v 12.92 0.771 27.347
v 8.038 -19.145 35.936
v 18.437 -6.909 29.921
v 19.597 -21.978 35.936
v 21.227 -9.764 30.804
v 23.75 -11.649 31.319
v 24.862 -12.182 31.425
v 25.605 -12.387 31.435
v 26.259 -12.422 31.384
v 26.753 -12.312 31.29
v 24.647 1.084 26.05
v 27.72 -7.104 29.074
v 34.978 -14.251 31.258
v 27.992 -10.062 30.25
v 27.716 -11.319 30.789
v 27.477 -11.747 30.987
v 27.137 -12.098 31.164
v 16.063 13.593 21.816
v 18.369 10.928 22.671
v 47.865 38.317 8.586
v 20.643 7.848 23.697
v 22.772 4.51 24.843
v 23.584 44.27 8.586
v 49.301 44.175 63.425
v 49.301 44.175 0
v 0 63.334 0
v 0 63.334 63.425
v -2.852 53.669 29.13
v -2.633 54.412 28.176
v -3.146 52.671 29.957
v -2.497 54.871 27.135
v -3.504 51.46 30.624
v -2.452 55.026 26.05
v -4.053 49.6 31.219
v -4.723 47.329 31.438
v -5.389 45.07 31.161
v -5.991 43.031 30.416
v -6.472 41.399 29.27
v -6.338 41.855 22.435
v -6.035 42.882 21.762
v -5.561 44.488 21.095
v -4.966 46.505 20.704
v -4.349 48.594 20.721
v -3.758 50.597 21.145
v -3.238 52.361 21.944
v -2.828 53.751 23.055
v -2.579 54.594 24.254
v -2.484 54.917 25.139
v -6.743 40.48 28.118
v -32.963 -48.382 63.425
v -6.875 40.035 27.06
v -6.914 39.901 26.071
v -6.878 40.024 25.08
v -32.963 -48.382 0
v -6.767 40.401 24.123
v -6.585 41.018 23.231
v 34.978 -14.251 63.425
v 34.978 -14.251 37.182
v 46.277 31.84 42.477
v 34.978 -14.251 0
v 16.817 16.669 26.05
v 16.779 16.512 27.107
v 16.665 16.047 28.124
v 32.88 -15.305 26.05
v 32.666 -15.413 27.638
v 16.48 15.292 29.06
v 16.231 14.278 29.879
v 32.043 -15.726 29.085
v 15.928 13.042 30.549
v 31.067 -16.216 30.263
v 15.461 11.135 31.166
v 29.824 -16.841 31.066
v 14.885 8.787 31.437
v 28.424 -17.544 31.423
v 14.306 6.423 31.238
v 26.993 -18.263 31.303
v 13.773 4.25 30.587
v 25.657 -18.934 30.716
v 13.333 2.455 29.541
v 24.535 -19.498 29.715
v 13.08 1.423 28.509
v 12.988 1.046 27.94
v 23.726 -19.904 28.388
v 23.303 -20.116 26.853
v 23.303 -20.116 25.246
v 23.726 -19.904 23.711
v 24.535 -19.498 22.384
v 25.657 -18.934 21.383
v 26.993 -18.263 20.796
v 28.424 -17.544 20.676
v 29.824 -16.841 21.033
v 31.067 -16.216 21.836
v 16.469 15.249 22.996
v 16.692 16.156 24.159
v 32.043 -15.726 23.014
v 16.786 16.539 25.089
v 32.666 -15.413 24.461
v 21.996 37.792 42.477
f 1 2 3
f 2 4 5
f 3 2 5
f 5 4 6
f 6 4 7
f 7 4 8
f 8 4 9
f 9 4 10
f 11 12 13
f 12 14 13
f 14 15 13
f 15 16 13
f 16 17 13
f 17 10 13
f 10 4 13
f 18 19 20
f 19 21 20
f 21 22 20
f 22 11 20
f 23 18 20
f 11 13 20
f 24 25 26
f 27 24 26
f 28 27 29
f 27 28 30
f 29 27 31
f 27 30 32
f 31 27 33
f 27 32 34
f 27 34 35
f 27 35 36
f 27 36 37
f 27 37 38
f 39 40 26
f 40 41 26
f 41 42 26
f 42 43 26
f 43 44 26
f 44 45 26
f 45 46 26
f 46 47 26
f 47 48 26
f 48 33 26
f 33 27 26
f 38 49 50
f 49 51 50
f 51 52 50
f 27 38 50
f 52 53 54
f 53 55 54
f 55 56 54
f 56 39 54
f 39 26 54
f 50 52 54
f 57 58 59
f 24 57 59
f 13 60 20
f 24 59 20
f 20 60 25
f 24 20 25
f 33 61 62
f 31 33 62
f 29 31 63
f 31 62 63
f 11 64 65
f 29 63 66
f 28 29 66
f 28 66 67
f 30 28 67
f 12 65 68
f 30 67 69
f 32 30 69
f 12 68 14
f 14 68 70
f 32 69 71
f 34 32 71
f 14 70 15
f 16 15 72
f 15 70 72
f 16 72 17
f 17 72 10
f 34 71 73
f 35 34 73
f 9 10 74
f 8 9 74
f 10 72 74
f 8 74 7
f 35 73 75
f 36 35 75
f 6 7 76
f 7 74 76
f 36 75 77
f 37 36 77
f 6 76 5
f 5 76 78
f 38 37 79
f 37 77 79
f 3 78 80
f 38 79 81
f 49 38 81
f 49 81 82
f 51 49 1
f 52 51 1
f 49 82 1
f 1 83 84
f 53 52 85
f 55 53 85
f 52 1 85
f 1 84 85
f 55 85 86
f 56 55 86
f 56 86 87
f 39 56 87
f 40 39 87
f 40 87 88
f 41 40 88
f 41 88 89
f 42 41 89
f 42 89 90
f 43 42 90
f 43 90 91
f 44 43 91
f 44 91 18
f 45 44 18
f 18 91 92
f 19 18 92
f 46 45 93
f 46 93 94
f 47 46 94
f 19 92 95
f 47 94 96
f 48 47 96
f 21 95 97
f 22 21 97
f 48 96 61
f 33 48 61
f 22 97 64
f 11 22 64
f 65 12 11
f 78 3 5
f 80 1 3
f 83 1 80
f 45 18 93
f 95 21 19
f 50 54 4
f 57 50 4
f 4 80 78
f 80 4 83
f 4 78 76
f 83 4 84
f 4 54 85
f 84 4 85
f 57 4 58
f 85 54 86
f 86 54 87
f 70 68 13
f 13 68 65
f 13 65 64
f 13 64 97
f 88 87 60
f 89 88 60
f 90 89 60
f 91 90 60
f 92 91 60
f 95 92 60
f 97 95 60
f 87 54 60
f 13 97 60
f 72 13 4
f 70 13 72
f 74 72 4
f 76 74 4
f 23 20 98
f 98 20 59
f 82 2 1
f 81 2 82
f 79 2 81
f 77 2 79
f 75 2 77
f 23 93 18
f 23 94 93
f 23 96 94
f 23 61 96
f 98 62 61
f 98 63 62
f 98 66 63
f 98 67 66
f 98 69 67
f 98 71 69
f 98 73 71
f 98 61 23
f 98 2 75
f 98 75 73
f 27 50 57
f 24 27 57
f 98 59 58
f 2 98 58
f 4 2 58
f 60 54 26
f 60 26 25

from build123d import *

# Parameters (mm, degrees)
F1_DEPTH = 63.4248778224
F2_R     = 5.3887909161
F3_DEPTH = 102.1241396666
F6_DEPTH = 25


with BuildPart() as f1:
    # F0 (on Top) → F1 (new body)
    with BuildSketch(Plane.XY):
        Polygon((-32.9633839428, -48.3821220696), (34.9777191877, -14.2513811588), (49.3006780744, 44.1745221615), (0, 63.3342713118), align=None)
    extrude(amount=F1_DEPTH)

    # F2 (on face) → F3 (cut)
    with BuildSketch(Plane(origin=(12.7649742408, -25.4101261271, 0), x_dir=(0.8935828585, 0.4488982902, 0), z_dir=(0.4488982902, -0.8935828585, 0))):
        with Locations((17.1215422451, 26.0495916009)):
            Circle(F2_R)
    extrude(amount=-F3_DEPTH, mode=Mode.SUBTRACT)

    # F5 (on face) → F6 (cut)
    with BuildSketch(Plane(origin=(36.2904519106, -8.8965103003, 0), x_dir=(0.2380972915, 0.9712413087, 0), z_dir=(0.9712413087, -0.2380972915, 0))):
        Polygon((48.6116707325, 8.5855266079), (41.9424623251, 42.4769595265), (-16.6801717132, 35.93596071), align=None)
    extrude(amount=-F6_DEPTH, mode=Mode.SUBTRACT)


solid = f1.part
